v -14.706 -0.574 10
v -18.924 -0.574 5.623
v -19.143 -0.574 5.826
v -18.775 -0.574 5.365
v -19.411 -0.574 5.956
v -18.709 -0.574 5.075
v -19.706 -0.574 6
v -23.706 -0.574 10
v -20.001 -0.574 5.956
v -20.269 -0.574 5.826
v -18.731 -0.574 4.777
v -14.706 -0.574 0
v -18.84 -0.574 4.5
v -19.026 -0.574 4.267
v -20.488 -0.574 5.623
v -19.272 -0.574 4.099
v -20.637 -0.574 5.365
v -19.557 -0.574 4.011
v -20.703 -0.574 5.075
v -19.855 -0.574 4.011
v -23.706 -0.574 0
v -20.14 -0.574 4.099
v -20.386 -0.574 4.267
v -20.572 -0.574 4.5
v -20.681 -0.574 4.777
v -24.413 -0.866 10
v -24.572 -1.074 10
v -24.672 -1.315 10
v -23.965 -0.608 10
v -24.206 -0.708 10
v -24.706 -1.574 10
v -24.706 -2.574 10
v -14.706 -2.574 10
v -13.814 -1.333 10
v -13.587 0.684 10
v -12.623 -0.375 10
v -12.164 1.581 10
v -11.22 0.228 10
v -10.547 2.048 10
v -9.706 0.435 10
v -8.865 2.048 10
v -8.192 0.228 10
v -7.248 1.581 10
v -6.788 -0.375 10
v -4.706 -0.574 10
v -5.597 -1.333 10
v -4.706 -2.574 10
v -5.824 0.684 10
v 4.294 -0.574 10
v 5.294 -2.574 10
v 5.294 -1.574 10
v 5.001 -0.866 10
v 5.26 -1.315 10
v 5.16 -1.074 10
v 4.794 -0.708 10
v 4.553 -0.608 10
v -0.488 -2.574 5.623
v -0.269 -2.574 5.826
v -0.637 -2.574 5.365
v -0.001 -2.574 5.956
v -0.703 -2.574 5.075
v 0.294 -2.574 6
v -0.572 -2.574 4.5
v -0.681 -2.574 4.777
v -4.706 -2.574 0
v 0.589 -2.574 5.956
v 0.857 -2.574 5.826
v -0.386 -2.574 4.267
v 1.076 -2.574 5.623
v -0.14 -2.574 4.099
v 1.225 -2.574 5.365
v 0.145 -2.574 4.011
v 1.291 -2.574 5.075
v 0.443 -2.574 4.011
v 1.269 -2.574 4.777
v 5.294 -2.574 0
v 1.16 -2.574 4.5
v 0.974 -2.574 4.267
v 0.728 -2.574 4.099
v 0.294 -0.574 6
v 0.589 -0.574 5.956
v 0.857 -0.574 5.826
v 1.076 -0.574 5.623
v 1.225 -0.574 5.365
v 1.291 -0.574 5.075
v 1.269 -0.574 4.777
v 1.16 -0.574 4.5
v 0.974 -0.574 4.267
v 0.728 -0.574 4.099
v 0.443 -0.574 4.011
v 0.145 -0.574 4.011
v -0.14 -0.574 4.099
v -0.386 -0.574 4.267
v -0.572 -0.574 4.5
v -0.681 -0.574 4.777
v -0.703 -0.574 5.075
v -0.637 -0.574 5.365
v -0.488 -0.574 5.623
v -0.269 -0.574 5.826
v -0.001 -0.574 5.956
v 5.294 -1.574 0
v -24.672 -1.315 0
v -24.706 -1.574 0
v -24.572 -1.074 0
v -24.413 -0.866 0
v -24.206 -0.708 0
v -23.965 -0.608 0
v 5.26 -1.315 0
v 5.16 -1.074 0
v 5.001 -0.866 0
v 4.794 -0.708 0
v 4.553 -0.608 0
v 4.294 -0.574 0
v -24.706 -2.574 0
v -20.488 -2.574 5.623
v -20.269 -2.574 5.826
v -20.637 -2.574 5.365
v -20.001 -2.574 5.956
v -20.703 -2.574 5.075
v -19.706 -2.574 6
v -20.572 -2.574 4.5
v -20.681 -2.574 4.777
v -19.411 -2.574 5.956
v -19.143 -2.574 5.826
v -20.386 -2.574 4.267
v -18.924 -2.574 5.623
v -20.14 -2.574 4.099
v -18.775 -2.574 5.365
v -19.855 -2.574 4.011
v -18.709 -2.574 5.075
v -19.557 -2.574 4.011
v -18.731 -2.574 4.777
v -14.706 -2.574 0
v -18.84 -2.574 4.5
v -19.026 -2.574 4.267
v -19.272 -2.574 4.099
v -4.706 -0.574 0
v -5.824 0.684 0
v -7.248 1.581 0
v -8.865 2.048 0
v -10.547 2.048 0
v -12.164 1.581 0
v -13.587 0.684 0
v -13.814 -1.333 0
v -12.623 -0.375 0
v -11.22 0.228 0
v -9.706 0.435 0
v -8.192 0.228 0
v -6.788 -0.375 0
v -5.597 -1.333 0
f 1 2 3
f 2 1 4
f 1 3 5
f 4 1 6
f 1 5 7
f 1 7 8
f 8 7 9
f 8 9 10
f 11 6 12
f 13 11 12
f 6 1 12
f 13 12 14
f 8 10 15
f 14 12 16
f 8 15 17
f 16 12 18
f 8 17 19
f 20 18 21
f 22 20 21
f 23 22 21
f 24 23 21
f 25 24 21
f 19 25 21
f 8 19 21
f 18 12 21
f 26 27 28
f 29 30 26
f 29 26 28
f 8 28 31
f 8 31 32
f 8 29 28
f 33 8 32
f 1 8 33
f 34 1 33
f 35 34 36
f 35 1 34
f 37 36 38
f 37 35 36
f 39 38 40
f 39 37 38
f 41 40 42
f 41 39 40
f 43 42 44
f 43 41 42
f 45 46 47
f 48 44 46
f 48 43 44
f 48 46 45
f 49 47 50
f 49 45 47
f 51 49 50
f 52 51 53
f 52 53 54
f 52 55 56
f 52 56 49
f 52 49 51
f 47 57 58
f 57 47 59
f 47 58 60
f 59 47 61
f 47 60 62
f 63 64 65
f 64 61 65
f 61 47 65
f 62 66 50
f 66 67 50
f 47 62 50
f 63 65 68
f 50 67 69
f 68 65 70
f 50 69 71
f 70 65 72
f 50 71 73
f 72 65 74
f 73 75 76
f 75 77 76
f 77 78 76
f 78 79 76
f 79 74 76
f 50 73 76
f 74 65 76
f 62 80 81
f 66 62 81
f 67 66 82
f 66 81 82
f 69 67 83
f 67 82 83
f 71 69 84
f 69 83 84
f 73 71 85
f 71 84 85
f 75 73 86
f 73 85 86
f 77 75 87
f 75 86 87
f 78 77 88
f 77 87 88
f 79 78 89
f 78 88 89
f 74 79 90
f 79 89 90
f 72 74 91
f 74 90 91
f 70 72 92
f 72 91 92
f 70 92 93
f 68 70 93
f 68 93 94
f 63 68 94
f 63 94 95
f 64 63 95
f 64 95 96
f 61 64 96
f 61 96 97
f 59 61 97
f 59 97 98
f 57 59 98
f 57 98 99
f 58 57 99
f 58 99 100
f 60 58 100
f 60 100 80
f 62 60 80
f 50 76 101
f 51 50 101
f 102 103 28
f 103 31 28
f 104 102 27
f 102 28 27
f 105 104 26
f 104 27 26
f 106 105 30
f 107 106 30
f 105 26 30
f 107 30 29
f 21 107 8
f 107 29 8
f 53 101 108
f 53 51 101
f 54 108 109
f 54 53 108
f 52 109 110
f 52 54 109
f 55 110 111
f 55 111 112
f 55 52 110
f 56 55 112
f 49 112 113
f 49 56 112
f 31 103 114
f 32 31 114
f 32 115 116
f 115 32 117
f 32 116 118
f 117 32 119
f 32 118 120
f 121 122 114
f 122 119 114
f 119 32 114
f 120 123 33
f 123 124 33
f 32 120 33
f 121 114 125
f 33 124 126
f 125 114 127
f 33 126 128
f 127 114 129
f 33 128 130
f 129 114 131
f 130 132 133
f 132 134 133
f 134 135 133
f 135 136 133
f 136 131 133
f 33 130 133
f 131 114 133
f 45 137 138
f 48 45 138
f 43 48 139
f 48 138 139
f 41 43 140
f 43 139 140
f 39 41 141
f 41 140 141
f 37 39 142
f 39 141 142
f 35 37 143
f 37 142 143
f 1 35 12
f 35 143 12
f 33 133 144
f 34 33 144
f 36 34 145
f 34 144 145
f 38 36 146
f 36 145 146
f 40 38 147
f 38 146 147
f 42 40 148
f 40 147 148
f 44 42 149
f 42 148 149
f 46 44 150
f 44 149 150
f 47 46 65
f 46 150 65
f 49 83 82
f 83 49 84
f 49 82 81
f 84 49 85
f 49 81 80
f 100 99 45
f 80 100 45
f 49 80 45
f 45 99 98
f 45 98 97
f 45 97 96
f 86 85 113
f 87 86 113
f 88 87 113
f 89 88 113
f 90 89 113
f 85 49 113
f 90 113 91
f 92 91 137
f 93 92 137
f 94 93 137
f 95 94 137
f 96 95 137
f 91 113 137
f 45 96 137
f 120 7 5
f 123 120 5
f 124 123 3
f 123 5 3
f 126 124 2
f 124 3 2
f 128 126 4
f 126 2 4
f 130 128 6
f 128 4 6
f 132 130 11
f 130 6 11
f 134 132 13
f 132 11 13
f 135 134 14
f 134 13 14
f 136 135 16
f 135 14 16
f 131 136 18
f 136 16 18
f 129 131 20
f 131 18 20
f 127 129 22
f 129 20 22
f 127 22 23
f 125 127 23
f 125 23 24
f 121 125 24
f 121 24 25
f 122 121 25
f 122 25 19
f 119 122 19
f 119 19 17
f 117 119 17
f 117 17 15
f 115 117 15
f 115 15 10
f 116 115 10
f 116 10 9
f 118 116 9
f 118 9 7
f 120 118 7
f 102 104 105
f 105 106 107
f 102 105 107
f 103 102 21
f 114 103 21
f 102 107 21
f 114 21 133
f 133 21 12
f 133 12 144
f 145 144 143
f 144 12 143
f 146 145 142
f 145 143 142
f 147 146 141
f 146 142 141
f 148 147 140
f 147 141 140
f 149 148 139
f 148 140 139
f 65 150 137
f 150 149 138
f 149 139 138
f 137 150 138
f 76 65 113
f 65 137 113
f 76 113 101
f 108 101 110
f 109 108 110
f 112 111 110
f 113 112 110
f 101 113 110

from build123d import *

# Parameters (mm, degrees)
BOSS_EXTRUDE1_DEPTH = 10
SKETCH2_R           = 1
CUT_EXTRUDE1_DEPTH  = 10
FILLET1_R           = 1


with BuildPart() as part:
    # Sketch1 → Boss-Extrude1 (new body)
    with BuildSketch(Plane.XY):
        with BuildLine():
            Line((-24.705882353, -2.573529412), (-14.705882353, -2.573529412))
            ThreePointArc((-14.705882353, -2.573529412), (-9.705882353, 0.434570501), (-4.705882353, -2.573529412))
            Line((-4.705882353, -2.573529412), (5.294117647, -2.573529412))
            Line((5.294117647, -2.573529412), (5.294117647, -0.573529412))
            Line((5.294117647, -0.573529412), (-4.705882353, -0.573529412))
            ThreePointArc((-4.705882353, -0.573529412), (-9.705882353, 2.106978403), (-14.705882353, -0.573529412))
            Line((-14.705882353, -0.573529412), (-24.705882353, -0.573529412))
            Line((-24.705882353, -0.573529412), (-24.705882353, -2.573529412))
        make_face()
    extrude(amount=BOSS_EXTRUDE1_DEPTH)

    # Sketch2 → Cut-Extrude1 (cut)
    with BuildSketch(Plane(origin=(0, -0.573529412, 0), x_dir=(1, 0, 0), z_dir=(0, 1, 0))):
        with Locations(Location((0.294117647, -5, 0), (0, 0, 270))):
            Circle(SKETCH2_R)
        with Locations(Location((-19.705882353, -5, 0), (0, 0, 270))):
            Circle(SKETCH2_R)
    extrude(amount=-CUT_EXTRUDE1_DEPTH, mode=Mode.SUBTRACT)

    # Fillet1
    fillet1_edges = [part.edges().sort_by_distance(p)[0] for p in [
        (-24.705882353, -0.573529412, 5),
        (5.294117647, -0.573529412, 5),
    ]]
    fillet(fillet1_edges, radius=FILLET1_R)


solid = part.part
